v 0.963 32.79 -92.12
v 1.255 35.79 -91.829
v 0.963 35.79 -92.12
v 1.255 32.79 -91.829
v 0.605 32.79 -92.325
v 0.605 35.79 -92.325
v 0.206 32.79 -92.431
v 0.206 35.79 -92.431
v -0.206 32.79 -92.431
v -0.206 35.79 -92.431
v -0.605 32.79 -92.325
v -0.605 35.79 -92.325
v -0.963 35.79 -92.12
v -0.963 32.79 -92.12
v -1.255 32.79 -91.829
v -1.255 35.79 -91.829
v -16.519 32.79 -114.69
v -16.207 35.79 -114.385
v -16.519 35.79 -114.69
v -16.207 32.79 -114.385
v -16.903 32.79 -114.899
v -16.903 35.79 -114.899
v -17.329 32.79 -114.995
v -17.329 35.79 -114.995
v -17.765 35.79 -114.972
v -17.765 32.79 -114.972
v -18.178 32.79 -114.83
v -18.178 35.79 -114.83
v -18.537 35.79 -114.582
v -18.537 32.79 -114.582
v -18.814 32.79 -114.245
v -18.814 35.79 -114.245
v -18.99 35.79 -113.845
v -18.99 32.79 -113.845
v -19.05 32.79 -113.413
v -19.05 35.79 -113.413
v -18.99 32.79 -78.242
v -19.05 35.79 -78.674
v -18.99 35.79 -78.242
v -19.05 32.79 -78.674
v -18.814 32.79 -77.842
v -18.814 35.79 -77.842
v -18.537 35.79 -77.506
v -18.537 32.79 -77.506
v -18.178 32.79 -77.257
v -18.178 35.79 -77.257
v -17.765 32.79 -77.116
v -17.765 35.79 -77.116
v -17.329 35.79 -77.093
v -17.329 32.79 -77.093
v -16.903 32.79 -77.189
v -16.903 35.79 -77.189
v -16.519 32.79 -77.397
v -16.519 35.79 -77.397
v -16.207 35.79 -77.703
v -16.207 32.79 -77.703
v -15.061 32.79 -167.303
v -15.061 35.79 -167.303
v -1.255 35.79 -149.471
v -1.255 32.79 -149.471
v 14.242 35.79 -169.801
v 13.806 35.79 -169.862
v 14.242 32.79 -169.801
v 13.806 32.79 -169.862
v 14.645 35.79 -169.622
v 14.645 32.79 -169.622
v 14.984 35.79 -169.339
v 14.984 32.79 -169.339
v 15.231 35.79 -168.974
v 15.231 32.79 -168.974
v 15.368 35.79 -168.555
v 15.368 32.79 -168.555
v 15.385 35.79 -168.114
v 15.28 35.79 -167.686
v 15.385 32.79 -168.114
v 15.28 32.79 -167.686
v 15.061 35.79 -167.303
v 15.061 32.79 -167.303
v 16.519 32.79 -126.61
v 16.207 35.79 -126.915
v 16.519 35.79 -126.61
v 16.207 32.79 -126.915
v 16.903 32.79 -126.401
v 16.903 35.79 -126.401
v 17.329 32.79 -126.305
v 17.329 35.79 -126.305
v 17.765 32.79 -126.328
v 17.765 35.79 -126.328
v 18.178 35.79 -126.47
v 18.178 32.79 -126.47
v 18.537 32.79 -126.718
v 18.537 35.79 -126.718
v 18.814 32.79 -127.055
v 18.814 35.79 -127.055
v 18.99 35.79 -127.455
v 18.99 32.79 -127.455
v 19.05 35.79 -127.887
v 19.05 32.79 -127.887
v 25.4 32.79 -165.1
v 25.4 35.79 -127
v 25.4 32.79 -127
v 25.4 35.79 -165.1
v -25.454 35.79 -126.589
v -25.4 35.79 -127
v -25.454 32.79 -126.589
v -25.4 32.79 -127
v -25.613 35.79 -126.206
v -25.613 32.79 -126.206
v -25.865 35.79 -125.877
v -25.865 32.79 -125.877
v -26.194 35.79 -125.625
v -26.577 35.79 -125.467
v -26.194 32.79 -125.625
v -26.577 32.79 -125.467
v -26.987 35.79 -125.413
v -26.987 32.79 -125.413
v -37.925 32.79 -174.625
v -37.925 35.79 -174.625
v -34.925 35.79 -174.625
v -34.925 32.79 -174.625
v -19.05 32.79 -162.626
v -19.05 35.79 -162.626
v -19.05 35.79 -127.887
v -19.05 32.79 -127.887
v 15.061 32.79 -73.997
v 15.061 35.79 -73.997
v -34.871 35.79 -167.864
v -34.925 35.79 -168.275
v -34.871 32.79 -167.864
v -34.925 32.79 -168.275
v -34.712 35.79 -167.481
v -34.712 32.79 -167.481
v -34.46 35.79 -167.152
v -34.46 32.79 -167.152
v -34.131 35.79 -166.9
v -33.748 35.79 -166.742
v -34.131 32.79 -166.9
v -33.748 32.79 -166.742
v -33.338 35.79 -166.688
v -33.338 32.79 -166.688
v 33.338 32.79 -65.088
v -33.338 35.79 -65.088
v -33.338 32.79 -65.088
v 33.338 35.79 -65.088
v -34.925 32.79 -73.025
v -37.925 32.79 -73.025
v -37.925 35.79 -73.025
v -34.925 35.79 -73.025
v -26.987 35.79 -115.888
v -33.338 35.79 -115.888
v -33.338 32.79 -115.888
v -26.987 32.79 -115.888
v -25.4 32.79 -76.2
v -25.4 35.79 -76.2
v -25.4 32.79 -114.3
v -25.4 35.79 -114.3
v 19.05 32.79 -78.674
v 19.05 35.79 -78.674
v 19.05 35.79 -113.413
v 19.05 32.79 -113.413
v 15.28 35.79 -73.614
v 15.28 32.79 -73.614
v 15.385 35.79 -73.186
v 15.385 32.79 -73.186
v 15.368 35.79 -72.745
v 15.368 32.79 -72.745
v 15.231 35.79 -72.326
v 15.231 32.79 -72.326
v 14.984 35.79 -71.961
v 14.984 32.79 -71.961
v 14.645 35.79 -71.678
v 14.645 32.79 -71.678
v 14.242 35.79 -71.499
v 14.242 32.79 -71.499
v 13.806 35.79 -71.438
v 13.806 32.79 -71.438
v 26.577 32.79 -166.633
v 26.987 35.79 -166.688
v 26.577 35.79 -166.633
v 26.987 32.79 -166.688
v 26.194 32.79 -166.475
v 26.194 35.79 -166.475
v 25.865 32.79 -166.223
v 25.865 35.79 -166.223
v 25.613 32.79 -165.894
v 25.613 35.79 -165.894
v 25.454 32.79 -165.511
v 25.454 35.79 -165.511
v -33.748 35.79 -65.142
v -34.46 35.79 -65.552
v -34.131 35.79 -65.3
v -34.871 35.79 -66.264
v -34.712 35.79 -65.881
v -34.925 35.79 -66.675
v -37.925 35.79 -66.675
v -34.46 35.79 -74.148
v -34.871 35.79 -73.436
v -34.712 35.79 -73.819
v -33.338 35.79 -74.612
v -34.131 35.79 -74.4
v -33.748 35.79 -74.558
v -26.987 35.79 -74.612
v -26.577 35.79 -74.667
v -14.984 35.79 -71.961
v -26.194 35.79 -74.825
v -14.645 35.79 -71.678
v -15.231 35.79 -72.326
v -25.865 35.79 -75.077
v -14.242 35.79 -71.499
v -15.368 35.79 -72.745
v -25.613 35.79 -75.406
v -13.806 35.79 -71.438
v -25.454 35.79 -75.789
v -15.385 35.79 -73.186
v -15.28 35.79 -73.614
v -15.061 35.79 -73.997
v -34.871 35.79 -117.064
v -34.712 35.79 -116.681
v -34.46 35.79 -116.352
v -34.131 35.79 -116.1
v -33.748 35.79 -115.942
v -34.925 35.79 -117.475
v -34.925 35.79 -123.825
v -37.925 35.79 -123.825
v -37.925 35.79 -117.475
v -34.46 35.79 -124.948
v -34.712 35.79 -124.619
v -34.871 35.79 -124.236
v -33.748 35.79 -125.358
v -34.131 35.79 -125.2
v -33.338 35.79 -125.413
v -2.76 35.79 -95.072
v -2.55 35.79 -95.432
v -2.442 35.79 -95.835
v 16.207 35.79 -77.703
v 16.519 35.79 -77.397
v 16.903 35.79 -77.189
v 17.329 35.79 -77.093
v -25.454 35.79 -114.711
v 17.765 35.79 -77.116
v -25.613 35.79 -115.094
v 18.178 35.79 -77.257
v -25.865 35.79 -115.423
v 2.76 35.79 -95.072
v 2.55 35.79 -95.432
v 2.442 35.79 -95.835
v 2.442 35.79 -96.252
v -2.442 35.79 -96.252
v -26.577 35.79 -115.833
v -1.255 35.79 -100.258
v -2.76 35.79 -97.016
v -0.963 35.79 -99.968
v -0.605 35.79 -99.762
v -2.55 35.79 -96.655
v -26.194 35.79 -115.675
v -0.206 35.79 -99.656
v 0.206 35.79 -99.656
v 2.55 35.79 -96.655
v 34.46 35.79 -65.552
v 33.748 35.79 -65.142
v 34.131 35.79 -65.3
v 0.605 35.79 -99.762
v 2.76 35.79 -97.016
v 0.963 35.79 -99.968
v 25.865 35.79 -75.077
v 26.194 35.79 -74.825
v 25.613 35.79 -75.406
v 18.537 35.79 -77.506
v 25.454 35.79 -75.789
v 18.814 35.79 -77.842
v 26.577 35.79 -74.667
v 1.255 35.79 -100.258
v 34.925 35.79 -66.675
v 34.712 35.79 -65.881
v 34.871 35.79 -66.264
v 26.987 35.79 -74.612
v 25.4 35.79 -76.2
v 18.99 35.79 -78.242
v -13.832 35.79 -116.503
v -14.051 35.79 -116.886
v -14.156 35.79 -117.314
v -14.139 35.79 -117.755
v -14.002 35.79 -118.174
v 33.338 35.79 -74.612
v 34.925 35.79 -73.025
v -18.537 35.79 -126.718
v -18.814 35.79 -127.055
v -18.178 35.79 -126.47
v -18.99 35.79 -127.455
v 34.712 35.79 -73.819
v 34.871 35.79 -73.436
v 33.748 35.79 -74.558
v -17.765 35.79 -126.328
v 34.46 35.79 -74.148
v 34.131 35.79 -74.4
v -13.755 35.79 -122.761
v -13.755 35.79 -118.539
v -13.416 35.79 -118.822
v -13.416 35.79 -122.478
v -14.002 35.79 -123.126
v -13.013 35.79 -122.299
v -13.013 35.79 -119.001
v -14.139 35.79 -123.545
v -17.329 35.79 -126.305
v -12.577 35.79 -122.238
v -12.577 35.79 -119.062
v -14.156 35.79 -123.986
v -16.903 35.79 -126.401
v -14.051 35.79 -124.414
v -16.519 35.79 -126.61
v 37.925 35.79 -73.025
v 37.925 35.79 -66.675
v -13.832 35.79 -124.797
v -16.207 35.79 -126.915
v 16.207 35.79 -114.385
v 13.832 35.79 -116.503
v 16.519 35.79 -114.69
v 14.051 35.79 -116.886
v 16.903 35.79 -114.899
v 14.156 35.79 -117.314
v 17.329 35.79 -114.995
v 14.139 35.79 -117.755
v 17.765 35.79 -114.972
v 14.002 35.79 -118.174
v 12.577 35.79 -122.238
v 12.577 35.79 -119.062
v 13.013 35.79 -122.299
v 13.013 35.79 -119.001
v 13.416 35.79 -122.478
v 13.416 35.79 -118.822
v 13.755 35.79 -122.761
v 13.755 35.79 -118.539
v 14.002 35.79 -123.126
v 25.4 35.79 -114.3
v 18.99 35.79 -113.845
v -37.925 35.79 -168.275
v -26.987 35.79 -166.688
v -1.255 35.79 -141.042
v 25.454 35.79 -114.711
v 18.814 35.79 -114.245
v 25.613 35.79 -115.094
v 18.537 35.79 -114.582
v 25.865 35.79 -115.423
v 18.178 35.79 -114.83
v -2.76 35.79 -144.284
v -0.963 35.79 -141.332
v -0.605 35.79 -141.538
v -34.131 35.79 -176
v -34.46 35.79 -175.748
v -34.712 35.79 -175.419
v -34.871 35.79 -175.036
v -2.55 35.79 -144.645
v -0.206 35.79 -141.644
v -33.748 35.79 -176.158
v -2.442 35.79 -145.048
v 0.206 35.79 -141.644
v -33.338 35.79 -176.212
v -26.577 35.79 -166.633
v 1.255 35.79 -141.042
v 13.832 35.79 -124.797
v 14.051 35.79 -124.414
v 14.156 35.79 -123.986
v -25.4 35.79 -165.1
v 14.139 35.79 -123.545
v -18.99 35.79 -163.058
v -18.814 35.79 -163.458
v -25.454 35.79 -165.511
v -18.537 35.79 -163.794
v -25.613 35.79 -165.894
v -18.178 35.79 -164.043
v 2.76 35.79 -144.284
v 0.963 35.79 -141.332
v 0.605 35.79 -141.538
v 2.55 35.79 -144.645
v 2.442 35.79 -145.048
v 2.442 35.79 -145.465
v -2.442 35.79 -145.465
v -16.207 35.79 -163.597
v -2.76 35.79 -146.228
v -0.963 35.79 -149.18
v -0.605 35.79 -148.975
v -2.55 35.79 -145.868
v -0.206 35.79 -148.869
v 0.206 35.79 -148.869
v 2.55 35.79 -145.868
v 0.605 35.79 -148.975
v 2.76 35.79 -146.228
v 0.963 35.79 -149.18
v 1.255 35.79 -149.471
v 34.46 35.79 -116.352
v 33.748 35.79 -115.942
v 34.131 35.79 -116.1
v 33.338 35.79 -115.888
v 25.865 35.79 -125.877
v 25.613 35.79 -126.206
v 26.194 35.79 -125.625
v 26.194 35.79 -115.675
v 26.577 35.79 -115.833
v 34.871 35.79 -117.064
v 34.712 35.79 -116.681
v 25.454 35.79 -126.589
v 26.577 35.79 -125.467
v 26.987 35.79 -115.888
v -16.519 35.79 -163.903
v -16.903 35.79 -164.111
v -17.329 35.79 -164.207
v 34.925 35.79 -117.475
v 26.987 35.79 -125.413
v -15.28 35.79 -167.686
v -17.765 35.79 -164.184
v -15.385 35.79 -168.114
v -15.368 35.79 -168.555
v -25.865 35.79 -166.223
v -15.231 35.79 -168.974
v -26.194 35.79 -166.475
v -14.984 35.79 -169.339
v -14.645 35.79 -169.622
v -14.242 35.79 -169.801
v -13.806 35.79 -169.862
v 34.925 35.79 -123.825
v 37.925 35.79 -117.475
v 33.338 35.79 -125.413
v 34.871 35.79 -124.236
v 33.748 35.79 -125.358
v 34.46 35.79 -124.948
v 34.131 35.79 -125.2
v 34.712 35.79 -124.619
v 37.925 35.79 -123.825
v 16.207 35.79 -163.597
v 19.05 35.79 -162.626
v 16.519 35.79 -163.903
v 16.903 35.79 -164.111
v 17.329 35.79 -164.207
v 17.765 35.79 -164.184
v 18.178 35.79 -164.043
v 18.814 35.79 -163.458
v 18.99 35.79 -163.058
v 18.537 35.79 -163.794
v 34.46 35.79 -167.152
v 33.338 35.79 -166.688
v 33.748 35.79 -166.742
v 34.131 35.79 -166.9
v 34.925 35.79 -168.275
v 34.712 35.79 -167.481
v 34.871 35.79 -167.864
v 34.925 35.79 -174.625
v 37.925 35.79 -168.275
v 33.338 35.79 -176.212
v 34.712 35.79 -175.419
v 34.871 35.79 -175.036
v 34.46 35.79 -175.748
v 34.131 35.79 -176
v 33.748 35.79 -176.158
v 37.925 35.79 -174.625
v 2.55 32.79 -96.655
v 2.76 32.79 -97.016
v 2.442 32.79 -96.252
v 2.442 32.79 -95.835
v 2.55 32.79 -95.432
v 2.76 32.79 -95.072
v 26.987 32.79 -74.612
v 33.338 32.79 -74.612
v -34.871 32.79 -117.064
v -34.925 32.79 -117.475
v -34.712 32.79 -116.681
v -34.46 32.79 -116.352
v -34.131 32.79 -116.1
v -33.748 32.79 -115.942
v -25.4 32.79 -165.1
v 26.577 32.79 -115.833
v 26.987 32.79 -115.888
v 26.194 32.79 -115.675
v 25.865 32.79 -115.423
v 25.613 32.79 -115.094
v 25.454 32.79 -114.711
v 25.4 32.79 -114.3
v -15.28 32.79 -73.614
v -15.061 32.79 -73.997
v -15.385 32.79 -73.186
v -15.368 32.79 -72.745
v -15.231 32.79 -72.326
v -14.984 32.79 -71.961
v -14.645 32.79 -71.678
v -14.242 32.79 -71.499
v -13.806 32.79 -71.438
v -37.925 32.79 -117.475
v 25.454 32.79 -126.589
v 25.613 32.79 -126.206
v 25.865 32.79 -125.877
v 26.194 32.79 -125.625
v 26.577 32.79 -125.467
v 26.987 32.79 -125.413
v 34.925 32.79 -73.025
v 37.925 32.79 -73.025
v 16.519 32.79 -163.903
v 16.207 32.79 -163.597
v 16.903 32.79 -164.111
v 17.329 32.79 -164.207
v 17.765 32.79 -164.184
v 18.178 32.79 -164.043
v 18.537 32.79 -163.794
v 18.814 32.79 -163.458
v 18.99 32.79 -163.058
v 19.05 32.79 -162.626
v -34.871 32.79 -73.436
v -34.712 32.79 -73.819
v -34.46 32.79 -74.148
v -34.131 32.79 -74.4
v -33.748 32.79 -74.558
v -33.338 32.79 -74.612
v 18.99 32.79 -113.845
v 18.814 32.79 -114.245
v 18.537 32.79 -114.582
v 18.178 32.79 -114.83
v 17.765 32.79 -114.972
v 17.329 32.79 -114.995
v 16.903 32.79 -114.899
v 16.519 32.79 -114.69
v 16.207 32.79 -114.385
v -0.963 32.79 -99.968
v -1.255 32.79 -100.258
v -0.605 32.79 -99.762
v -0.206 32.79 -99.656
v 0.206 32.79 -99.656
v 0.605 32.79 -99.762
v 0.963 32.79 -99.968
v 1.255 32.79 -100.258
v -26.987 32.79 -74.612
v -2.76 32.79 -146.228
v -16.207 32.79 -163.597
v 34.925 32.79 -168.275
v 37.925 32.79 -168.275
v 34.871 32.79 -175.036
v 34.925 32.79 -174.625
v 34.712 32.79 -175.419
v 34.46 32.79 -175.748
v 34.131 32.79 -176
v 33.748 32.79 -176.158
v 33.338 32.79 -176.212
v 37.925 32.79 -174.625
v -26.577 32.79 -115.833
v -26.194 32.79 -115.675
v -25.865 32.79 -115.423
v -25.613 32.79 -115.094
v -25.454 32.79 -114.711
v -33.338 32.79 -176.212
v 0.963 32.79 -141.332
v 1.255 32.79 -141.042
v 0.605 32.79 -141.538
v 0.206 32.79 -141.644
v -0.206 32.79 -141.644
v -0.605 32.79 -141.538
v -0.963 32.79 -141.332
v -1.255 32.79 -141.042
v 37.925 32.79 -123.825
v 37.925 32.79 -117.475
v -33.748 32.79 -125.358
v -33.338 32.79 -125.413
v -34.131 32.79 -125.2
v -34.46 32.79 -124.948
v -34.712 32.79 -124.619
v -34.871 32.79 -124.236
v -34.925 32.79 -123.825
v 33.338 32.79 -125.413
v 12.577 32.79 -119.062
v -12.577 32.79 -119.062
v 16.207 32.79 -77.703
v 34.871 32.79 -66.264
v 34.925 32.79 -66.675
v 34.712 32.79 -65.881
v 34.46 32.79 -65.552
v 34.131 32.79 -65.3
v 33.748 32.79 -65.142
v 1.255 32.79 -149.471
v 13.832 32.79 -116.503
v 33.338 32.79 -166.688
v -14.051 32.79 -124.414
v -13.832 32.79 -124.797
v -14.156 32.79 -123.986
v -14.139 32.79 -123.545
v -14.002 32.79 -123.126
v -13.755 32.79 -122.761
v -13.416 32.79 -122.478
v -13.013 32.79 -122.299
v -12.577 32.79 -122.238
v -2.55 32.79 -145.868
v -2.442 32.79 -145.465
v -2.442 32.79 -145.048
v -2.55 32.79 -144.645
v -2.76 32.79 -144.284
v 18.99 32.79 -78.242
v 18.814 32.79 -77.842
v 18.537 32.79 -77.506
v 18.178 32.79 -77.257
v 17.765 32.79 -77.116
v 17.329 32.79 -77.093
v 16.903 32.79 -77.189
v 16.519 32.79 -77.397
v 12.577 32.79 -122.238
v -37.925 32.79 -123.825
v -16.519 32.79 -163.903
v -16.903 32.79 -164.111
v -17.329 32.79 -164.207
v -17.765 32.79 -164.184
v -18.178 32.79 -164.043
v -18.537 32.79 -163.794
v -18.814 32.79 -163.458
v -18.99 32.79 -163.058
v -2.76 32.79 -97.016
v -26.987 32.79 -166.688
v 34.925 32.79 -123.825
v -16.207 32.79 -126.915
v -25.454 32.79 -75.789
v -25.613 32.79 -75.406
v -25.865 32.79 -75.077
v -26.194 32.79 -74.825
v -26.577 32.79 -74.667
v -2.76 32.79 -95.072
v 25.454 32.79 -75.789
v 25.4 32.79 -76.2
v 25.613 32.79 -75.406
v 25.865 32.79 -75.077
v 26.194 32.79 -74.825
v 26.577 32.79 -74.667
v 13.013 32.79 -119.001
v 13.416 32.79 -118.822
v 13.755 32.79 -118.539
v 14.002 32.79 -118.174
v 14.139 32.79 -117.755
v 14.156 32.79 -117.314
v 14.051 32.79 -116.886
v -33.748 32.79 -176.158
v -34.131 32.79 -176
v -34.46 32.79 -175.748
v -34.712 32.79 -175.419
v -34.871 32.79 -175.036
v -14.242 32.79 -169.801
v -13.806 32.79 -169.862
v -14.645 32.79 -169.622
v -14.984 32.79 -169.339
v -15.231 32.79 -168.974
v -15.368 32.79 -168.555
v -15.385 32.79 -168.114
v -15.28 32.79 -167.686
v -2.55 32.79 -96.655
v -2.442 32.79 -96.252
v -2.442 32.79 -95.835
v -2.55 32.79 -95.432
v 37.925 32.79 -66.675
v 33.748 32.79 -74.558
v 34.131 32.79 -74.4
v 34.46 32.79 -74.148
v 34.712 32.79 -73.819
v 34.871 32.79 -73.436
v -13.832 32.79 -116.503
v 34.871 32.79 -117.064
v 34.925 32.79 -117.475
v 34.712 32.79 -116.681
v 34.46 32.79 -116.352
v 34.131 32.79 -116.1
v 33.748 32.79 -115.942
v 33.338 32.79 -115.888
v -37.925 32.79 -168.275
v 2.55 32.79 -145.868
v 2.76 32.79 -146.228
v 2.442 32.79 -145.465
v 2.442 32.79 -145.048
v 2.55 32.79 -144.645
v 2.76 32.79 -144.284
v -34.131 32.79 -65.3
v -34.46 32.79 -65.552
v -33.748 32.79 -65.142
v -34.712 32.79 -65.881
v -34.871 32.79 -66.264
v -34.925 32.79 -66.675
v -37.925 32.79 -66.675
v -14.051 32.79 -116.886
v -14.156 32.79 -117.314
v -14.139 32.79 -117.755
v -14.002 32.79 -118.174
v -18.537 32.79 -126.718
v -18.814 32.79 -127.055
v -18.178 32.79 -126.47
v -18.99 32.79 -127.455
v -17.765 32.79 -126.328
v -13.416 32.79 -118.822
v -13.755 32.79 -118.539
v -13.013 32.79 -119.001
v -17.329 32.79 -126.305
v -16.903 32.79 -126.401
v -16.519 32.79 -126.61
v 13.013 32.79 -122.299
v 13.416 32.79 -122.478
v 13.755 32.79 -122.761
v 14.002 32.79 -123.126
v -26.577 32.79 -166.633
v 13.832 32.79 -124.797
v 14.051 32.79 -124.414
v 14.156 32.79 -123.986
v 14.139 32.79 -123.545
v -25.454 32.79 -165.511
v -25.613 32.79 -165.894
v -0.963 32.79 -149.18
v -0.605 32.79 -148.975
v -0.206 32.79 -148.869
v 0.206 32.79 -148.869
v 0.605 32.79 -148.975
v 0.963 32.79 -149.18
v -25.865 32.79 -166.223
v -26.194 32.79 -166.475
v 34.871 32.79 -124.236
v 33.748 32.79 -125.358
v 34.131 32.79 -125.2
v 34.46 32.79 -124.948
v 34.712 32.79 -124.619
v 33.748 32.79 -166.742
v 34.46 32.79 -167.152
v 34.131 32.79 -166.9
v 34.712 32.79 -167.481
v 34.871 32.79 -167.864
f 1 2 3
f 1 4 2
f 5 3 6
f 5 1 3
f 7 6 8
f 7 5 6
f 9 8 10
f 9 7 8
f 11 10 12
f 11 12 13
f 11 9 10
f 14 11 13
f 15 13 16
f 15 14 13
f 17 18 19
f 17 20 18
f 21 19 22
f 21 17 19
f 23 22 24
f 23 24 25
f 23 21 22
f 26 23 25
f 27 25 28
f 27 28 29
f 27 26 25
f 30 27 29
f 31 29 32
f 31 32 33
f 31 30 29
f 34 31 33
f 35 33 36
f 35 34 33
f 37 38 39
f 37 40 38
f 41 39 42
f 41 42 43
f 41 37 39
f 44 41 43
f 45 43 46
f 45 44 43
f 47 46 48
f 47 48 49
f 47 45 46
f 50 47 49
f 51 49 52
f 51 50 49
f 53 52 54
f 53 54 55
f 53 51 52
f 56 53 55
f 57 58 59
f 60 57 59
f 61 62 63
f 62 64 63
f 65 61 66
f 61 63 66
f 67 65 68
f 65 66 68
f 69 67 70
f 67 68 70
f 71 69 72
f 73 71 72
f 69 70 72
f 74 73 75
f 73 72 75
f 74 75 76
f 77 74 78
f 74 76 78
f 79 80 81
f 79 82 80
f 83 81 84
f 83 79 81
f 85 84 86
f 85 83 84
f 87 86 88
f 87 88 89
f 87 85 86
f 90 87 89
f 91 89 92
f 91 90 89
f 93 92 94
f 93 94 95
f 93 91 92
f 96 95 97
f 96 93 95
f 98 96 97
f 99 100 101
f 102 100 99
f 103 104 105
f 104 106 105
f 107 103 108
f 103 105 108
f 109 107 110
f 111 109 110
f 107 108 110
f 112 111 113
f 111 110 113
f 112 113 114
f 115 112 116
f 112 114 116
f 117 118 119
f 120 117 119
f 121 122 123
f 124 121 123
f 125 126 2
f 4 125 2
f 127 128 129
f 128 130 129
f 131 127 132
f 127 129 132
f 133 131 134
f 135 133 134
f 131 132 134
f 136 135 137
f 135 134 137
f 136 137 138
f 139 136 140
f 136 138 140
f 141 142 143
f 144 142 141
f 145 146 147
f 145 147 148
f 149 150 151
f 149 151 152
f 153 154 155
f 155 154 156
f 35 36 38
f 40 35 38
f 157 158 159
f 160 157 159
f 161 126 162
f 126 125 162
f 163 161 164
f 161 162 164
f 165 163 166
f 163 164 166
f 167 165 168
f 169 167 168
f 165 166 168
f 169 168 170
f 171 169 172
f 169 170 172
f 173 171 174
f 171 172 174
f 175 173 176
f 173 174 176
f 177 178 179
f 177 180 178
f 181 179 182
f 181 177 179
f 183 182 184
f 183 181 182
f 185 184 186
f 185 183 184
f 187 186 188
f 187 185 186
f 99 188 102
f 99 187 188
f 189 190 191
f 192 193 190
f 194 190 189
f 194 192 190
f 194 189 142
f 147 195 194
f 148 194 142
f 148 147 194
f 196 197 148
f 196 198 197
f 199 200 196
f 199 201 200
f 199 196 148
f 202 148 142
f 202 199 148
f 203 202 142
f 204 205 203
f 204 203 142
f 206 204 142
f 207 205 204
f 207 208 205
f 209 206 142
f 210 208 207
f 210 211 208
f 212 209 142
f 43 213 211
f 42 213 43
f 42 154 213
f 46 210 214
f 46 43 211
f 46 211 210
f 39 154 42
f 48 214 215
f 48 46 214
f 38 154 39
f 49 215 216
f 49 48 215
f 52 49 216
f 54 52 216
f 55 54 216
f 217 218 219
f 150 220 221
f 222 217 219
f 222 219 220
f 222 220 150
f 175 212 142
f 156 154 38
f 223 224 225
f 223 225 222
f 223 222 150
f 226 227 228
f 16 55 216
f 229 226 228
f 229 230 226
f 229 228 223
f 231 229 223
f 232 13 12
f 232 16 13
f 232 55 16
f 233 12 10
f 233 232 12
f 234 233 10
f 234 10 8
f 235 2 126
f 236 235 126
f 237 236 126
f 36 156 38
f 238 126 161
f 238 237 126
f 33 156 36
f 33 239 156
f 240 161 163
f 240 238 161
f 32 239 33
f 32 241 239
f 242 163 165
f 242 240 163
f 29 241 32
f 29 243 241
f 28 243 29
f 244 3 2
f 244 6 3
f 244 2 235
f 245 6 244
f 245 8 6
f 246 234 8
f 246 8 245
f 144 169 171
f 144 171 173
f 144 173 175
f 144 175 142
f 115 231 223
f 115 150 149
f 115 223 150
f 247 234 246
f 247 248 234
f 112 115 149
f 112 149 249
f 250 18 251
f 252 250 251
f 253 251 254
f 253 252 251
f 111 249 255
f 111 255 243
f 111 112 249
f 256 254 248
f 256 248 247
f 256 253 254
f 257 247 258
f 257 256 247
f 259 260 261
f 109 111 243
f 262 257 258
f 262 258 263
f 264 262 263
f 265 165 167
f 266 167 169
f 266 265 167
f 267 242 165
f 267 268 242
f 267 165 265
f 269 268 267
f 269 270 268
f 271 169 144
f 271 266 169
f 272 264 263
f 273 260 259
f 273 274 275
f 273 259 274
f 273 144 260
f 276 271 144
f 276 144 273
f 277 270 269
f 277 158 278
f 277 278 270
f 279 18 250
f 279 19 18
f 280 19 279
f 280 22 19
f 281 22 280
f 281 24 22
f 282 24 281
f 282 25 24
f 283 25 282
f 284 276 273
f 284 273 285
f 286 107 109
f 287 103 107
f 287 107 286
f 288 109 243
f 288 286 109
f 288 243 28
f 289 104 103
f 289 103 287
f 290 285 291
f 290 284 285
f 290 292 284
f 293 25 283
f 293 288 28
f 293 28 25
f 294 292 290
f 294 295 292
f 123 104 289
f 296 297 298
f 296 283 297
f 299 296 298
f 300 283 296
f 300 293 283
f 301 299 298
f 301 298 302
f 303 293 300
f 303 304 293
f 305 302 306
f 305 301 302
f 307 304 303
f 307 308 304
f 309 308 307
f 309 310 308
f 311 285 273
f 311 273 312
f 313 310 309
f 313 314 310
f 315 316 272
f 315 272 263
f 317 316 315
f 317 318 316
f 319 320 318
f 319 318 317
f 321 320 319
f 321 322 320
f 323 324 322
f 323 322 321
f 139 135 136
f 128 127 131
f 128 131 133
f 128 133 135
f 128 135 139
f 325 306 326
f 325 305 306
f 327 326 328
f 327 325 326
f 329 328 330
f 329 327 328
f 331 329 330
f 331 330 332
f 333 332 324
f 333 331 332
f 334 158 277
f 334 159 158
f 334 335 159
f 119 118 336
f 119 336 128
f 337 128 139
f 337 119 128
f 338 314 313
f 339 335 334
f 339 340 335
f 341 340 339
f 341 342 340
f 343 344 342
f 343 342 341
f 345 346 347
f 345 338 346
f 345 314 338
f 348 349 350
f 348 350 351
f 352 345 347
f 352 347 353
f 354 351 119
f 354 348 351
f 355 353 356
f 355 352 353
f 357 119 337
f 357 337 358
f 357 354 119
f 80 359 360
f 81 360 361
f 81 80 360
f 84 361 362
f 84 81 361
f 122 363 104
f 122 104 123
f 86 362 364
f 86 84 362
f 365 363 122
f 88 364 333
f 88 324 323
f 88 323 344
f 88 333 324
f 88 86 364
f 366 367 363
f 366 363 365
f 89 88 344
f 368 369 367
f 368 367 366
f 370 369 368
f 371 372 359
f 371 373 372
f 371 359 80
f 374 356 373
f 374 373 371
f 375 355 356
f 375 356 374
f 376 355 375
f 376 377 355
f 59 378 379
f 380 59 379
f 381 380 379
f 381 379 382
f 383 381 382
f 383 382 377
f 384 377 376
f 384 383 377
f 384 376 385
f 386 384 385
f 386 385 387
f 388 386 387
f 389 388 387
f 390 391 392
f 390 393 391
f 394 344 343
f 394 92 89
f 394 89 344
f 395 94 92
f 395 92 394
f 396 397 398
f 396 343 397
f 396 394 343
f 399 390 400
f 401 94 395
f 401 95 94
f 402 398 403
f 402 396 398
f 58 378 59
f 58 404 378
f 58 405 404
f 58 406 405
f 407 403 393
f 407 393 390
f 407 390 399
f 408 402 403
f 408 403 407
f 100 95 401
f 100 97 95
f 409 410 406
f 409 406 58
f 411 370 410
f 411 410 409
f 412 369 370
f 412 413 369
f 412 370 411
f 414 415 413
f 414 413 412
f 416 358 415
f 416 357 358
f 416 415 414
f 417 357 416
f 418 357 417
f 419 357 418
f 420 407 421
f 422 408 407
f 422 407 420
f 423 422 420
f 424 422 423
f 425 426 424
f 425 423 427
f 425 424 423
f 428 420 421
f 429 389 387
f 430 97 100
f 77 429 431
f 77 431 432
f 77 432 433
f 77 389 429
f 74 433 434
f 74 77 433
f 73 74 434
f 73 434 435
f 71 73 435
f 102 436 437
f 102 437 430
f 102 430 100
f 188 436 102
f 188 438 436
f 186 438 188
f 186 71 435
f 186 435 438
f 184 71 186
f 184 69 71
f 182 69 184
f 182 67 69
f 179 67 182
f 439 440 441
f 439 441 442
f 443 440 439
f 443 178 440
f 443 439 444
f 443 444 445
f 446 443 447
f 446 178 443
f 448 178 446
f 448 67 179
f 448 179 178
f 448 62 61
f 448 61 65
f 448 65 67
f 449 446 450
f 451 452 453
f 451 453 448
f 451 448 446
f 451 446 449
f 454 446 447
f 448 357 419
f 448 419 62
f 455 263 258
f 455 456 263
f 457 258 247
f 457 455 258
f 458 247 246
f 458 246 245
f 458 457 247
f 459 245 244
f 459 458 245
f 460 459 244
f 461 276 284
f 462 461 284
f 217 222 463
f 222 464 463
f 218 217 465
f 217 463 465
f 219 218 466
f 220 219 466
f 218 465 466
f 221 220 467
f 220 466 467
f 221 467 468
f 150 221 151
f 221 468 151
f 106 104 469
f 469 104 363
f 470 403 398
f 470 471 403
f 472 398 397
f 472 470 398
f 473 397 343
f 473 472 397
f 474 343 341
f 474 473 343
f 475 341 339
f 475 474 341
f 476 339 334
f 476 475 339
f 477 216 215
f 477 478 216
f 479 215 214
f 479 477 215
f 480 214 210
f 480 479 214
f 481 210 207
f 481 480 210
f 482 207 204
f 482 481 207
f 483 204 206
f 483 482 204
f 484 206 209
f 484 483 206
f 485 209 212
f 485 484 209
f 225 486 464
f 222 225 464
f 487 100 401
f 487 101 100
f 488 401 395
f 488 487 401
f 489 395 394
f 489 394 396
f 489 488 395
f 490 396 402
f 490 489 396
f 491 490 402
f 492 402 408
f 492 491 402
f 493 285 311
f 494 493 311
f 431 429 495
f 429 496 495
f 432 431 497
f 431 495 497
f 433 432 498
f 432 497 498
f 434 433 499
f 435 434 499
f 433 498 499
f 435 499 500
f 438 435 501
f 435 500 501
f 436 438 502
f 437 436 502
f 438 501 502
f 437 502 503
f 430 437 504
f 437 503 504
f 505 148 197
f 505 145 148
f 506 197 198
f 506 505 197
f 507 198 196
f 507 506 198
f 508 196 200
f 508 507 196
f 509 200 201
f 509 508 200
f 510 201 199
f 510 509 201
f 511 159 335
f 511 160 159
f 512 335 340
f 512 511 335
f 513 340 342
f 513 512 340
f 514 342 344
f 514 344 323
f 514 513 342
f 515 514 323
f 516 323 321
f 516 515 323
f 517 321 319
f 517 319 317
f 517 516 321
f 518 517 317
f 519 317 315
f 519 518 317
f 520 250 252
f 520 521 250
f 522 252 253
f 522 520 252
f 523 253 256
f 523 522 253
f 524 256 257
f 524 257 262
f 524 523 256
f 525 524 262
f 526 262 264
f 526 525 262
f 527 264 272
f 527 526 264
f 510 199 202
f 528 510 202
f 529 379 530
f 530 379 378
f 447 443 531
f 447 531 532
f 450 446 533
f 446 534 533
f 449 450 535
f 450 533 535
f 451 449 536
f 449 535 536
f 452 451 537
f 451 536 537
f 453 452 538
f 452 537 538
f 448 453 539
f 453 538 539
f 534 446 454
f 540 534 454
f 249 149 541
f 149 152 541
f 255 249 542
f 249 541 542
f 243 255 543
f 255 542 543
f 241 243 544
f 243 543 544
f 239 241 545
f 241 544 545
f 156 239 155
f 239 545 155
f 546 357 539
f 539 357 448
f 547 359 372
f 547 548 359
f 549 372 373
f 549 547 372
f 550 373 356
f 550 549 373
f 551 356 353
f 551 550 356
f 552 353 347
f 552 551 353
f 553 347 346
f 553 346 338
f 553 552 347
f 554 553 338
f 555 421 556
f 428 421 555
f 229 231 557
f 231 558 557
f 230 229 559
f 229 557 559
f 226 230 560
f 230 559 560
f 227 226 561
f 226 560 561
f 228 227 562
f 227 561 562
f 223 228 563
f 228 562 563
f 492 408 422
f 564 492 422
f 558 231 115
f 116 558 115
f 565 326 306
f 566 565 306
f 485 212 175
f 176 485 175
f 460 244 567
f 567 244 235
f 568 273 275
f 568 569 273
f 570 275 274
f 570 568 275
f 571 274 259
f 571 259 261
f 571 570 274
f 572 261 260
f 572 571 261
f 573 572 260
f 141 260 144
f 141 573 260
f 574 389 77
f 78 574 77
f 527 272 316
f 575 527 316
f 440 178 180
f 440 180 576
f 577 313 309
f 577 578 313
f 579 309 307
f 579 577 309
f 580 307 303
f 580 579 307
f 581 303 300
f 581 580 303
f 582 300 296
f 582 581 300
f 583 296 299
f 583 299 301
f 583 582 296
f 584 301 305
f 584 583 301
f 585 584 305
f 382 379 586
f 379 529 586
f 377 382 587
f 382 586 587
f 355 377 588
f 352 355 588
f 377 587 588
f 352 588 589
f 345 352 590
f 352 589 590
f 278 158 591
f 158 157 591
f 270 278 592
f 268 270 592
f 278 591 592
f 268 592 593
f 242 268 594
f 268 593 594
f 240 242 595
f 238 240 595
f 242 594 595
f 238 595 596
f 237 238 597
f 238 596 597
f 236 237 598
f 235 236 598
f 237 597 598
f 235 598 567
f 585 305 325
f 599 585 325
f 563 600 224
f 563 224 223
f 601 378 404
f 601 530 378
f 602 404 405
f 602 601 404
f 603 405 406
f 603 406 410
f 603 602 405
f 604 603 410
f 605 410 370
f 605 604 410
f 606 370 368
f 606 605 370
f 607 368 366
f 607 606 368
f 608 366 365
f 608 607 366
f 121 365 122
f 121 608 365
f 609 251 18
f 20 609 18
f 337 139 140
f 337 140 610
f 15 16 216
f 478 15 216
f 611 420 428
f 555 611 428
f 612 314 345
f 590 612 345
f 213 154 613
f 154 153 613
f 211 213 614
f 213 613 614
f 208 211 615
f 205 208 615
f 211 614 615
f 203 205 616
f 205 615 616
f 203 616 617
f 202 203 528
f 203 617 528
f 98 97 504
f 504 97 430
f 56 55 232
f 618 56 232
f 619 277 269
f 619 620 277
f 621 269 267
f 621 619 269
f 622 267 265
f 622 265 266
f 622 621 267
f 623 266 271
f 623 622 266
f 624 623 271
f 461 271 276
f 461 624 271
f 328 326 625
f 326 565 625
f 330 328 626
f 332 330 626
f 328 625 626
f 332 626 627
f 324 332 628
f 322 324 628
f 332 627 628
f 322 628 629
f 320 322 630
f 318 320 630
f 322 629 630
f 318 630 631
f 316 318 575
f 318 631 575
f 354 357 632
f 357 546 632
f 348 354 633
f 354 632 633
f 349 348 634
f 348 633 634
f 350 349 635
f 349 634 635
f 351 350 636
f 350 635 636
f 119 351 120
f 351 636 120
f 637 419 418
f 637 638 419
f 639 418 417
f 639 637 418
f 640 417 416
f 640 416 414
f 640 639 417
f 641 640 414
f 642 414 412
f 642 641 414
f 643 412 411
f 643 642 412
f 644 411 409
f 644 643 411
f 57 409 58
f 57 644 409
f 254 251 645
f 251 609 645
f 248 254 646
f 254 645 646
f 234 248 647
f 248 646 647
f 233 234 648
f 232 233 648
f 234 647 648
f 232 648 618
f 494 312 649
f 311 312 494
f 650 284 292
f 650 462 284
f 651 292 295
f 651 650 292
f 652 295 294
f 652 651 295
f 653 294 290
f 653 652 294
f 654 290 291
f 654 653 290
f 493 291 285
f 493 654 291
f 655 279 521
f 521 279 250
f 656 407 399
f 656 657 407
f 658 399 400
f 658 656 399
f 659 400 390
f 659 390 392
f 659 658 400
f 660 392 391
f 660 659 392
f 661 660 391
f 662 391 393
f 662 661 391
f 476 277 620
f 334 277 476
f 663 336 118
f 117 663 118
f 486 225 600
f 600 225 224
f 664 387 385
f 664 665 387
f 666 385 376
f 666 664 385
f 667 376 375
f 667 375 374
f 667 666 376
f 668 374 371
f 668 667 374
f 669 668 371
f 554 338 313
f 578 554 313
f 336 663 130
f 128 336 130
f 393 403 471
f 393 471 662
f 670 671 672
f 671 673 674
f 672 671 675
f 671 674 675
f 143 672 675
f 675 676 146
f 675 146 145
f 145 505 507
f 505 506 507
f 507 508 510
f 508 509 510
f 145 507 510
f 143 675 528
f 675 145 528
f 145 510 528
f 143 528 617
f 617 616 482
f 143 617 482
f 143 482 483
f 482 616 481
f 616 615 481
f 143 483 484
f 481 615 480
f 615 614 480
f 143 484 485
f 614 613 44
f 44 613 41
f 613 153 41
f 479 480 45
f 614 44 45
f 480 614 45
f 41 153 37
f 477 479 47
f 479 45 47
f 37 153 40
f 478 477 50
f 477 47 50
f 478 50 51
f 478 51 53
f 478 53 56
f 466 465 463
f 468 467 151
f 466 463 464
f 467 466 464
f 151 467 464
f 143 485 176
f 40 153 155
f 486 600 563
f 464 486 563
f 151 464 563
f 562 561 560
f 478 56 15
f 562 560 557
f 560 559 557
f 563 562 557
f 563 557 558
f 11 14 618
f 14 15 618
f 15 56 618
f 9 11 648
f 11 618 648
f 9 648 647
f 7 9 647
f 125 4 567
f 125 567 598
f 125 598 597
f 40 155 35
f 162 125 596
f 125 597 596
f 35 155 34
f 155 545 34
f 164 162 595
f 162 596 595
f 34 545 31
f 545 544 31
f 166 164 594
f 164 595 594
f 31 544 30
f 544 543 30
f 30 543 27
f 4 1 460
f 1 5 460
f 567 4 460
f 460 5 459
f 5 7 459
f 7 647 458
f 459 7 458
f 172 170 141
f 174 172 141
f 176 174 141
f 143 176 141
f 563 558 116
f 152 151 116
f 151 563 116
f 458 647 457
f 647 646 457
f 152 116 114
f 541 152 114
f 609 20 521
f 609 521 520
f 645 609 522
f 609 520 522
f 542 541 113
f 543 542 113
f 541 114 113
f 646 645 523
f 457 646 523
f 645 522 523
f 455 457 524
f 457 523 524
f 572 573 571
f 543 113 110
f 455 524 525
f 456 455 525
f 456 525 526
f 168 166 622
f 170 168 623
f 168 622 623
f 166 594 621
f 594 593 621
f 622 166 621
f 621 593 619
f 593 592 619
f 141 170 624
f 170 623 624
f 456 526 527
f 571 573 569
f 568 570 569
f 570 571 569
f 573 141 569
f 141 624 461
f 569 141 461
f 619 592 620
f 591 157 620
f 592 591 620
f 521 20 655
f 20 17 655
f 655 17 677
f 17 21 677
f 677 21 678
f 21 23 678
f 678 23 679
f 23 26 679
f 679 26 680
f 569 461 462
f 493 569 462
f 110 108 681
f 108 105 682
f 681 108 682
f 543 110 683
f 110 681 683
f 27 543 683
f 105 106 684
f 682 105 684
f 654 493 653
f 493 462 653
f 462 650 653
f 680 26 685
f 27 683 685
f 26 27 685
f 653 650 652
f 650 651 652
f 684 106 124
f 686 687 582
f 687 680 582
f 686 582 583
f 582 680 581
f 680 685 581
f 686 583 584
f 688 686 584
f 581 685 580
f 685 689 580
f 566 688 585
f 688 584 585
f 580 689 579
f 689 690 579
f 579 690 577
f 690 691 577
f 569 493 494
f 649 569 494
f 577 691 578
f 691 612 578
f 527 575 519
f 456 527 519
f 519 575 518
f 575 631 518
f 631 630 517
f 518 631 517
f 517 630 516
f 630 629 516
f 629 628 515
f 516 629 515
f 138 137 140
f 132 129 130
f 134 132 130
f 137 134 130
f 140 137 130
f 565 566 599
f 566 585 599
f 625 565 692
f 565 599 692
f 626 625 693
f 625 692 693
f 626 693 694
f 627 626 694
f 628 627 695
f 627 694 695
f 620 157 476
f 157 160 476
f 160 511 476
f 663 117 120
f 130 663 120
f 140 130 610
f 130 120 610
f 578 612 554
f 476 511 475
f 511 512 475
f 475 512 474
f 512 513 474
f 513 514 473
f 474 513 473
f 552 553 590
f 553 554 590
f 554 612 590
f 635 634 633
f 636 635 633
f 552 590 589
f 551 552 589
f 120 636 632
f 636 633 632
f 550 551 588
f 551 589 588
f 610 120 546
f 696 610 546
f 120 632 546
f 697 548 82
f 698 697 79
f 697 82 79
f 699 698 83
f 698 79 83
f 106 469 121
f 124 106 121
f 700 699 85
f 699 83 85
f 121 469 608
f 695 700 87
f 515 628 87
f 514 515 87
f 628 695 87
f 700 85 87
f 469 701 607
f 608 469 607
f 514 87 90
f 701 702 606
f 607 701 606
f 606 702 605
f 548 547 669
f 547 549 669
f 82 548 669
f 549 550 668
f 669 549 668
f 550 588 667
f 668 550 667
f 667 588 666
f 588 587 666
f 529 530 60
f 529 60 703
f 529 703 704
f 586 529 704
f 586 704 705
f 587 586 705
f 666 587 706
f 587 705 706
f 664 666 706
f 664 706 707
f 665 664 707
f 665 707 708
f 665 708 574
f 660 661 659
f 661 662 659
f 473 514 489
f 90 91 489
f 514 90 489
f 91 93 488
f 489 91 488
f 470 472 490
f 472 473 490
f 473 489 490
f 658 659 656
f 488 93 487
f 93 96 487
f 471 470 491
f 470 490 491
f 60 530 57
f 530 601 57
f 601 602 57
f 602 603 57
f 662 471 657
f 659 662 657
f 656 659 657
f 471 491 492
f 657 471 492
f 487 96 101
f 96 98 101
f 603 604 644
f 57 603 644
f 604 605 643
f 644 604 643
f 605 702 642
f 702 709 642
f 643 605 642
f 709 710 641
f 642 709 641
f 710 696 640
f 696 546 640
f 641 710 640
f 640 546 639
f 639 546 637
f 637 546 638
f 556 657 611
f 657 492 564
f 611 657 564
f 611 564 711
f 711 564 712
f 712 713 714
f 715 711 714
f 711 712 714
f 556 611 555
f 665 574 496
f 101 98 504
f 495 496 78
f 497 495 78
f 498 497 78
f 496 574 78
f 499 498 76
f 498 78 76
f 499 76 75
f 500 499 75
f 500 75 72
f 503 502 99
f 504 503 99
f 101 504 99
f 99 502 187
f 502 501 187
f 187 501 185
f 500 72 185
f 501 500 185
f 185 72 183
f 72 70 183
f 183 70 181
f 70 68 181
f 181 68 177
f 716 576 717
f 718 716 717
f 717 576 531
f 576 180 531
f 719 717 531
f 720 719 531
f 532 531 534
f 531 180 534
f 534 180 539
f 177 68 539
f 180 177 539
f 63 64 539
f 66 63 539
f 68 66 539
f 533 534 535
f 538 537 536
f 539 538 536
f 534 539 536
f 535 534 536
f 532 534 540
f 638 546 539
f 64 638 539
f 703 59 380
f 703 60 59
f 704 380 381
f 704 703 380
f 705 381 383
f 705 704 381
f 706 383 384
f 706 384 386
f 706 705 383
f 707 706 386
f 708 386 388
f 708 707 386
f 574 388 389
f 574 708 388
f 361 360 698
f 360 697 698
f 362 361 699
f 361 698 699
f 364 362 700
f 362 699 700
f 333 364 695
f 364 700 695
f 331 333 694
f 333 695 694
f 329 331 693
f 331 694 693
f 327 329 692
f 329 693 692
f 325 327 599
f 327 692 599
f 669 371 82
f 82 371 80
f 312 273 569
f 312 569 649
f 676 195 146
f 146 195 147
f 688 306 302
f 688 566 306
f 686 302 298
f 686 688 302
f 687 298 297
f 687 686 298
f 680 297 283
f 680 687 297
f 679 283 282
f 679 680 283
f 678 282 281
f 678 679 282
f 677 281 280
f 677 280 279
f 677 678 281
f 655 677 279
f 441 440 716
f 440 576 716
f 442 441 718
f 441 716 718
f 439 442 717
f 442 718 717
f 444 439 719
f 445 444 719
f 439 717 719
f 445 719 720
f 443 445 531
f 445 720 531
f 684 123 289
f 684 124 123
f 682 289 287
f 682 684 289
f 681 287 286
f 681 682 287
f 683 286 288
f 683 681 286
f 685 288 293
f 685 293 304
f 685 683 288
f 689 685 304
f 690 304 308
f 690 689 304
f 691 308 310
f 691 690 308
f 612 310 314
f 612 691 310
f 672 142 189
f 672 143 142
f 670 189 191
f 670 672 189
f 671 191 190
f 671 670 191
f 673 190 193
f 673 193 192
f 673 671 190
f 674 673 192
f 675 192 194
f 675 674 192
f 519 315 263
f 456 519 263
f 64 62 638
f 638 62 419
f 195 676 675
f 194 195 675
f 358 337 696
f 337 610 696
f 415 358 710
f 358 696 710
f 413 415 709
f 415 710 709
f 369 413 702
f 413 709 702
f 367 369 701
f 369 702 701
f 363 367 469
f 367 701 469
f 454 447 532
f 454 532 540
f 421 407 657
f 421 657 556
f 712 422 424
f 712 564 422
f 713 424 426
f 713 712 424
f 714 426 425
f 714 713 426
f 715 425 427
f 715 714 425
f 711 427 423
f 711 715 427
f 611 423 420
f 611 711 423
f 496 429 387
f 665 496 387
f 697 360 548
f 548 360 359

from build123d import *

# Parameters (mm, degrees)
SKETCH1_W           = 50.8
SKETCH1_H           = 111.125
BOSS_EXTRUDE1_DEPTH = 1.5
SKETCH2_W           = 9.525
SKETCH2_H           = 9.525
BOSS_EXTRUDE2_DEPTH = 3
CUT_EXTRUDE1_DEPTH  = 3
FILLET1_R           = 1.5875
SKETCH5_W           = 3
SKETCH5_H           = 6.35
BOSS_EXTRUDE3_DEPTH = 3


with BuildPart() as part:
    # Sketch1 → Boss-Extrude1 (new, symmetric)
    with BuildSketch(Plane(origin=(0, 34.29, 0), x_dir=(1, 0, 0), z_dir=(0, 1, 0))):
        with Locations((0, 120.65)):
            Rectangle(SKETCH1_W, SKETCH1_H)
    extrude(amount=BOSS_EXTRUDE1_DEPTH, both=True)

    # Sketch2 → Boss-Extrude2 (add)
    with BuildSketch(Plane(origin=(0, 35.79, 0), x_dir=(1, 0, 0), z_dir=(0, 1, 0))):
        with Locations((30.1625, 171.45)):
            Rectangle(SKETCH2_W, SKETCH2_H)
        with Locations((-30.1625, 171.45)):
            Rectangle(SKETCH2_W, SKETCH2_H)
        with Locations((30.1625, 120.65)):
            Rectangle(SKETCH2_W, SKETCH2_H)
        with Locations((-30.1625, 120.65)):
            Rectangle(SKETCH2_W, SKETCH2_H)
        with Locations((30.1625, 69.85)):
            Rectangle(SKETCH2_W, SKETCH2_H)
        with Locations((-30.1625, 69.85)):
            Rectangle(SKETCH2_W, SKETCH2_H)
    extrude(amount=-BOSS_EXTRUDE2_DEPTH)

    # Sketch4 → Cut-Extrude1 (cut)
    with BuildSketch(Plane(origin=(0, 35.79, 0), x_dir=(1, 0, 0), z_dir=(0, 1, 0))):
        Polygon((17.042345512, 169.8625), (-17.042345512, 169.8625), (0, 147.84947038), align=None)
        Polygon((-2.007654488, 145.25625), (-19.05, 167.26927962), (-19.05, 123.24322038), align=None)
        Polygon((19.05, 167.26927962), (2.007654488, 145.25625), (19.05, 123.24322038), align=None)
        Polygon((15.813313254, 122.2375), (0, 142.66302962), (-15.813313254, 122.2375), align=None)
        Polygon((-2.007654488, 96.04375), (-19.05, 118.05677962), (-19.05, 74.03072038), align=None)
        Polygon((15.813313254, 119.0625), (-15.813313254, 119.0625), (0, 98.63697038), align=None)
        Polygon((19.05, 74.03072038), (19.05, 118.05677962), (2.007654488, 96.04375), align=None)
        Polygon((17.042345512, 71.4375), (0, 93.45052962), (-17.042345512, 71.4375), align=None)
    extrude(amount=-CUT_EXTRUDE1_DEPTH, mode=Mode.SUBTRACT)

    # Fillet1
    fillet1_edges = [part.edges().sort_by_distance(p)[0] for p in [
        (15.813313254, 34.29, -122.2375),
        (-15.813313254, 34.29, -122.2375),
        (0, 34.29, -142.66302962),
        (15.813313254, 34.29, -119.0625),
        (0, 34.29, -98.63697038),
        (-15.813313254, 34.29, -119.0625),
        (17.042345512, 34.29, -71.4375),
        (-17.042345512, 34.29, -71.4375),
        (0, 34.29, -93.45052962),
        (-2.007654488, 34.29, -96.04375),
        (-19.05, 34.29, -74.03072038),
        (-19.05, 34.29, -118.05677962),
        (-2.007654488, 34.29, -145.25625),
        (-19.05, 34.29, -123.24322038),
        (-19.05, 34.29, -167.26927962),
        (19.05, 34.29, -123.24322038),
        (2.007654488, 34.29, -145.25625),
        (19.05, 34.29, -167.26927962),
        (0, 34.29, -147.84947038),
        (-17.042345512, 34.29, -169.8625),
        (17.042345512, 34.29, -169.8625),
        (19.05, 34.29, -118.05677962),
        (19.05, 34.29, -74.03072038),
        (2.007654488, 34.29, -96.04375),
        (34.925, 34.29, -65.0875),
        (34.925, 34.29, -74.6125),
        (25.4, 34.29, -74.6125),
        (-25.4, 34.29, -115.8875),
        (-25.4, 34.29, -125.4125),
        (-34.925, 34.29, -125.4125),
        (-34.925, 34.29, -115.8875),
        (34.925, 34.29, -115.8875),
        (34.925, 34.29, -125.4125),
        (25.4, 34.29, -125.4125),
        (25.4, 34.29, -115.8875),
        (-25.4, 34.29, -166.6875),
        (-34.925, 34.29, -176.2125),
        (-34.925, 34.29, -166.6875),
        (-25.4, 34.29, -74.6125),
        (-34.925, 34.29, -74.6125),
        (-34.925, 34.29, -65.0875),
        (34.925, 34.29, -166.6875),
        (34.925, 34.29, -176.2125),
        (25.4, 34.29, -166.6875),
    ]]
    fillet(fillet1_edges, radius=FILLET1_R)

    # Sketch5 → Boss-Extrude3 (add)
    with BuildSketch(Plane(origin=(0, 35.79, 0), x_dir=(1, 0, 0), z_dir=(0, 1, 0))):
        with Locations((36.425, 171.45)):
            Rectangle(SKETCH5_W, SKETCH5_H)
        with Locations((-36.425, 171.45)):
            Rectangle(SKETCH5_W, SKETCH5_H)
        with Locations((36.425, 120.65)):
            Rectangle(SKETCH5_W, SKETCH5_H)
        with Locations((-36.425, 120.65)):
            Rectangle(SKETCH5_W, SKETCH5_H)
        with Locations((36.425, 69.85)):
            Rectangle(SKETCH5_W, SKETCH5_H)
        with Locations((-36.425, 69.85)):
            Rectangle(SKETCH5_W, SKETCH5_H)
    extrude(amount=-BOSS_EXTRUDE3_DEPTH)


solid = part.part
